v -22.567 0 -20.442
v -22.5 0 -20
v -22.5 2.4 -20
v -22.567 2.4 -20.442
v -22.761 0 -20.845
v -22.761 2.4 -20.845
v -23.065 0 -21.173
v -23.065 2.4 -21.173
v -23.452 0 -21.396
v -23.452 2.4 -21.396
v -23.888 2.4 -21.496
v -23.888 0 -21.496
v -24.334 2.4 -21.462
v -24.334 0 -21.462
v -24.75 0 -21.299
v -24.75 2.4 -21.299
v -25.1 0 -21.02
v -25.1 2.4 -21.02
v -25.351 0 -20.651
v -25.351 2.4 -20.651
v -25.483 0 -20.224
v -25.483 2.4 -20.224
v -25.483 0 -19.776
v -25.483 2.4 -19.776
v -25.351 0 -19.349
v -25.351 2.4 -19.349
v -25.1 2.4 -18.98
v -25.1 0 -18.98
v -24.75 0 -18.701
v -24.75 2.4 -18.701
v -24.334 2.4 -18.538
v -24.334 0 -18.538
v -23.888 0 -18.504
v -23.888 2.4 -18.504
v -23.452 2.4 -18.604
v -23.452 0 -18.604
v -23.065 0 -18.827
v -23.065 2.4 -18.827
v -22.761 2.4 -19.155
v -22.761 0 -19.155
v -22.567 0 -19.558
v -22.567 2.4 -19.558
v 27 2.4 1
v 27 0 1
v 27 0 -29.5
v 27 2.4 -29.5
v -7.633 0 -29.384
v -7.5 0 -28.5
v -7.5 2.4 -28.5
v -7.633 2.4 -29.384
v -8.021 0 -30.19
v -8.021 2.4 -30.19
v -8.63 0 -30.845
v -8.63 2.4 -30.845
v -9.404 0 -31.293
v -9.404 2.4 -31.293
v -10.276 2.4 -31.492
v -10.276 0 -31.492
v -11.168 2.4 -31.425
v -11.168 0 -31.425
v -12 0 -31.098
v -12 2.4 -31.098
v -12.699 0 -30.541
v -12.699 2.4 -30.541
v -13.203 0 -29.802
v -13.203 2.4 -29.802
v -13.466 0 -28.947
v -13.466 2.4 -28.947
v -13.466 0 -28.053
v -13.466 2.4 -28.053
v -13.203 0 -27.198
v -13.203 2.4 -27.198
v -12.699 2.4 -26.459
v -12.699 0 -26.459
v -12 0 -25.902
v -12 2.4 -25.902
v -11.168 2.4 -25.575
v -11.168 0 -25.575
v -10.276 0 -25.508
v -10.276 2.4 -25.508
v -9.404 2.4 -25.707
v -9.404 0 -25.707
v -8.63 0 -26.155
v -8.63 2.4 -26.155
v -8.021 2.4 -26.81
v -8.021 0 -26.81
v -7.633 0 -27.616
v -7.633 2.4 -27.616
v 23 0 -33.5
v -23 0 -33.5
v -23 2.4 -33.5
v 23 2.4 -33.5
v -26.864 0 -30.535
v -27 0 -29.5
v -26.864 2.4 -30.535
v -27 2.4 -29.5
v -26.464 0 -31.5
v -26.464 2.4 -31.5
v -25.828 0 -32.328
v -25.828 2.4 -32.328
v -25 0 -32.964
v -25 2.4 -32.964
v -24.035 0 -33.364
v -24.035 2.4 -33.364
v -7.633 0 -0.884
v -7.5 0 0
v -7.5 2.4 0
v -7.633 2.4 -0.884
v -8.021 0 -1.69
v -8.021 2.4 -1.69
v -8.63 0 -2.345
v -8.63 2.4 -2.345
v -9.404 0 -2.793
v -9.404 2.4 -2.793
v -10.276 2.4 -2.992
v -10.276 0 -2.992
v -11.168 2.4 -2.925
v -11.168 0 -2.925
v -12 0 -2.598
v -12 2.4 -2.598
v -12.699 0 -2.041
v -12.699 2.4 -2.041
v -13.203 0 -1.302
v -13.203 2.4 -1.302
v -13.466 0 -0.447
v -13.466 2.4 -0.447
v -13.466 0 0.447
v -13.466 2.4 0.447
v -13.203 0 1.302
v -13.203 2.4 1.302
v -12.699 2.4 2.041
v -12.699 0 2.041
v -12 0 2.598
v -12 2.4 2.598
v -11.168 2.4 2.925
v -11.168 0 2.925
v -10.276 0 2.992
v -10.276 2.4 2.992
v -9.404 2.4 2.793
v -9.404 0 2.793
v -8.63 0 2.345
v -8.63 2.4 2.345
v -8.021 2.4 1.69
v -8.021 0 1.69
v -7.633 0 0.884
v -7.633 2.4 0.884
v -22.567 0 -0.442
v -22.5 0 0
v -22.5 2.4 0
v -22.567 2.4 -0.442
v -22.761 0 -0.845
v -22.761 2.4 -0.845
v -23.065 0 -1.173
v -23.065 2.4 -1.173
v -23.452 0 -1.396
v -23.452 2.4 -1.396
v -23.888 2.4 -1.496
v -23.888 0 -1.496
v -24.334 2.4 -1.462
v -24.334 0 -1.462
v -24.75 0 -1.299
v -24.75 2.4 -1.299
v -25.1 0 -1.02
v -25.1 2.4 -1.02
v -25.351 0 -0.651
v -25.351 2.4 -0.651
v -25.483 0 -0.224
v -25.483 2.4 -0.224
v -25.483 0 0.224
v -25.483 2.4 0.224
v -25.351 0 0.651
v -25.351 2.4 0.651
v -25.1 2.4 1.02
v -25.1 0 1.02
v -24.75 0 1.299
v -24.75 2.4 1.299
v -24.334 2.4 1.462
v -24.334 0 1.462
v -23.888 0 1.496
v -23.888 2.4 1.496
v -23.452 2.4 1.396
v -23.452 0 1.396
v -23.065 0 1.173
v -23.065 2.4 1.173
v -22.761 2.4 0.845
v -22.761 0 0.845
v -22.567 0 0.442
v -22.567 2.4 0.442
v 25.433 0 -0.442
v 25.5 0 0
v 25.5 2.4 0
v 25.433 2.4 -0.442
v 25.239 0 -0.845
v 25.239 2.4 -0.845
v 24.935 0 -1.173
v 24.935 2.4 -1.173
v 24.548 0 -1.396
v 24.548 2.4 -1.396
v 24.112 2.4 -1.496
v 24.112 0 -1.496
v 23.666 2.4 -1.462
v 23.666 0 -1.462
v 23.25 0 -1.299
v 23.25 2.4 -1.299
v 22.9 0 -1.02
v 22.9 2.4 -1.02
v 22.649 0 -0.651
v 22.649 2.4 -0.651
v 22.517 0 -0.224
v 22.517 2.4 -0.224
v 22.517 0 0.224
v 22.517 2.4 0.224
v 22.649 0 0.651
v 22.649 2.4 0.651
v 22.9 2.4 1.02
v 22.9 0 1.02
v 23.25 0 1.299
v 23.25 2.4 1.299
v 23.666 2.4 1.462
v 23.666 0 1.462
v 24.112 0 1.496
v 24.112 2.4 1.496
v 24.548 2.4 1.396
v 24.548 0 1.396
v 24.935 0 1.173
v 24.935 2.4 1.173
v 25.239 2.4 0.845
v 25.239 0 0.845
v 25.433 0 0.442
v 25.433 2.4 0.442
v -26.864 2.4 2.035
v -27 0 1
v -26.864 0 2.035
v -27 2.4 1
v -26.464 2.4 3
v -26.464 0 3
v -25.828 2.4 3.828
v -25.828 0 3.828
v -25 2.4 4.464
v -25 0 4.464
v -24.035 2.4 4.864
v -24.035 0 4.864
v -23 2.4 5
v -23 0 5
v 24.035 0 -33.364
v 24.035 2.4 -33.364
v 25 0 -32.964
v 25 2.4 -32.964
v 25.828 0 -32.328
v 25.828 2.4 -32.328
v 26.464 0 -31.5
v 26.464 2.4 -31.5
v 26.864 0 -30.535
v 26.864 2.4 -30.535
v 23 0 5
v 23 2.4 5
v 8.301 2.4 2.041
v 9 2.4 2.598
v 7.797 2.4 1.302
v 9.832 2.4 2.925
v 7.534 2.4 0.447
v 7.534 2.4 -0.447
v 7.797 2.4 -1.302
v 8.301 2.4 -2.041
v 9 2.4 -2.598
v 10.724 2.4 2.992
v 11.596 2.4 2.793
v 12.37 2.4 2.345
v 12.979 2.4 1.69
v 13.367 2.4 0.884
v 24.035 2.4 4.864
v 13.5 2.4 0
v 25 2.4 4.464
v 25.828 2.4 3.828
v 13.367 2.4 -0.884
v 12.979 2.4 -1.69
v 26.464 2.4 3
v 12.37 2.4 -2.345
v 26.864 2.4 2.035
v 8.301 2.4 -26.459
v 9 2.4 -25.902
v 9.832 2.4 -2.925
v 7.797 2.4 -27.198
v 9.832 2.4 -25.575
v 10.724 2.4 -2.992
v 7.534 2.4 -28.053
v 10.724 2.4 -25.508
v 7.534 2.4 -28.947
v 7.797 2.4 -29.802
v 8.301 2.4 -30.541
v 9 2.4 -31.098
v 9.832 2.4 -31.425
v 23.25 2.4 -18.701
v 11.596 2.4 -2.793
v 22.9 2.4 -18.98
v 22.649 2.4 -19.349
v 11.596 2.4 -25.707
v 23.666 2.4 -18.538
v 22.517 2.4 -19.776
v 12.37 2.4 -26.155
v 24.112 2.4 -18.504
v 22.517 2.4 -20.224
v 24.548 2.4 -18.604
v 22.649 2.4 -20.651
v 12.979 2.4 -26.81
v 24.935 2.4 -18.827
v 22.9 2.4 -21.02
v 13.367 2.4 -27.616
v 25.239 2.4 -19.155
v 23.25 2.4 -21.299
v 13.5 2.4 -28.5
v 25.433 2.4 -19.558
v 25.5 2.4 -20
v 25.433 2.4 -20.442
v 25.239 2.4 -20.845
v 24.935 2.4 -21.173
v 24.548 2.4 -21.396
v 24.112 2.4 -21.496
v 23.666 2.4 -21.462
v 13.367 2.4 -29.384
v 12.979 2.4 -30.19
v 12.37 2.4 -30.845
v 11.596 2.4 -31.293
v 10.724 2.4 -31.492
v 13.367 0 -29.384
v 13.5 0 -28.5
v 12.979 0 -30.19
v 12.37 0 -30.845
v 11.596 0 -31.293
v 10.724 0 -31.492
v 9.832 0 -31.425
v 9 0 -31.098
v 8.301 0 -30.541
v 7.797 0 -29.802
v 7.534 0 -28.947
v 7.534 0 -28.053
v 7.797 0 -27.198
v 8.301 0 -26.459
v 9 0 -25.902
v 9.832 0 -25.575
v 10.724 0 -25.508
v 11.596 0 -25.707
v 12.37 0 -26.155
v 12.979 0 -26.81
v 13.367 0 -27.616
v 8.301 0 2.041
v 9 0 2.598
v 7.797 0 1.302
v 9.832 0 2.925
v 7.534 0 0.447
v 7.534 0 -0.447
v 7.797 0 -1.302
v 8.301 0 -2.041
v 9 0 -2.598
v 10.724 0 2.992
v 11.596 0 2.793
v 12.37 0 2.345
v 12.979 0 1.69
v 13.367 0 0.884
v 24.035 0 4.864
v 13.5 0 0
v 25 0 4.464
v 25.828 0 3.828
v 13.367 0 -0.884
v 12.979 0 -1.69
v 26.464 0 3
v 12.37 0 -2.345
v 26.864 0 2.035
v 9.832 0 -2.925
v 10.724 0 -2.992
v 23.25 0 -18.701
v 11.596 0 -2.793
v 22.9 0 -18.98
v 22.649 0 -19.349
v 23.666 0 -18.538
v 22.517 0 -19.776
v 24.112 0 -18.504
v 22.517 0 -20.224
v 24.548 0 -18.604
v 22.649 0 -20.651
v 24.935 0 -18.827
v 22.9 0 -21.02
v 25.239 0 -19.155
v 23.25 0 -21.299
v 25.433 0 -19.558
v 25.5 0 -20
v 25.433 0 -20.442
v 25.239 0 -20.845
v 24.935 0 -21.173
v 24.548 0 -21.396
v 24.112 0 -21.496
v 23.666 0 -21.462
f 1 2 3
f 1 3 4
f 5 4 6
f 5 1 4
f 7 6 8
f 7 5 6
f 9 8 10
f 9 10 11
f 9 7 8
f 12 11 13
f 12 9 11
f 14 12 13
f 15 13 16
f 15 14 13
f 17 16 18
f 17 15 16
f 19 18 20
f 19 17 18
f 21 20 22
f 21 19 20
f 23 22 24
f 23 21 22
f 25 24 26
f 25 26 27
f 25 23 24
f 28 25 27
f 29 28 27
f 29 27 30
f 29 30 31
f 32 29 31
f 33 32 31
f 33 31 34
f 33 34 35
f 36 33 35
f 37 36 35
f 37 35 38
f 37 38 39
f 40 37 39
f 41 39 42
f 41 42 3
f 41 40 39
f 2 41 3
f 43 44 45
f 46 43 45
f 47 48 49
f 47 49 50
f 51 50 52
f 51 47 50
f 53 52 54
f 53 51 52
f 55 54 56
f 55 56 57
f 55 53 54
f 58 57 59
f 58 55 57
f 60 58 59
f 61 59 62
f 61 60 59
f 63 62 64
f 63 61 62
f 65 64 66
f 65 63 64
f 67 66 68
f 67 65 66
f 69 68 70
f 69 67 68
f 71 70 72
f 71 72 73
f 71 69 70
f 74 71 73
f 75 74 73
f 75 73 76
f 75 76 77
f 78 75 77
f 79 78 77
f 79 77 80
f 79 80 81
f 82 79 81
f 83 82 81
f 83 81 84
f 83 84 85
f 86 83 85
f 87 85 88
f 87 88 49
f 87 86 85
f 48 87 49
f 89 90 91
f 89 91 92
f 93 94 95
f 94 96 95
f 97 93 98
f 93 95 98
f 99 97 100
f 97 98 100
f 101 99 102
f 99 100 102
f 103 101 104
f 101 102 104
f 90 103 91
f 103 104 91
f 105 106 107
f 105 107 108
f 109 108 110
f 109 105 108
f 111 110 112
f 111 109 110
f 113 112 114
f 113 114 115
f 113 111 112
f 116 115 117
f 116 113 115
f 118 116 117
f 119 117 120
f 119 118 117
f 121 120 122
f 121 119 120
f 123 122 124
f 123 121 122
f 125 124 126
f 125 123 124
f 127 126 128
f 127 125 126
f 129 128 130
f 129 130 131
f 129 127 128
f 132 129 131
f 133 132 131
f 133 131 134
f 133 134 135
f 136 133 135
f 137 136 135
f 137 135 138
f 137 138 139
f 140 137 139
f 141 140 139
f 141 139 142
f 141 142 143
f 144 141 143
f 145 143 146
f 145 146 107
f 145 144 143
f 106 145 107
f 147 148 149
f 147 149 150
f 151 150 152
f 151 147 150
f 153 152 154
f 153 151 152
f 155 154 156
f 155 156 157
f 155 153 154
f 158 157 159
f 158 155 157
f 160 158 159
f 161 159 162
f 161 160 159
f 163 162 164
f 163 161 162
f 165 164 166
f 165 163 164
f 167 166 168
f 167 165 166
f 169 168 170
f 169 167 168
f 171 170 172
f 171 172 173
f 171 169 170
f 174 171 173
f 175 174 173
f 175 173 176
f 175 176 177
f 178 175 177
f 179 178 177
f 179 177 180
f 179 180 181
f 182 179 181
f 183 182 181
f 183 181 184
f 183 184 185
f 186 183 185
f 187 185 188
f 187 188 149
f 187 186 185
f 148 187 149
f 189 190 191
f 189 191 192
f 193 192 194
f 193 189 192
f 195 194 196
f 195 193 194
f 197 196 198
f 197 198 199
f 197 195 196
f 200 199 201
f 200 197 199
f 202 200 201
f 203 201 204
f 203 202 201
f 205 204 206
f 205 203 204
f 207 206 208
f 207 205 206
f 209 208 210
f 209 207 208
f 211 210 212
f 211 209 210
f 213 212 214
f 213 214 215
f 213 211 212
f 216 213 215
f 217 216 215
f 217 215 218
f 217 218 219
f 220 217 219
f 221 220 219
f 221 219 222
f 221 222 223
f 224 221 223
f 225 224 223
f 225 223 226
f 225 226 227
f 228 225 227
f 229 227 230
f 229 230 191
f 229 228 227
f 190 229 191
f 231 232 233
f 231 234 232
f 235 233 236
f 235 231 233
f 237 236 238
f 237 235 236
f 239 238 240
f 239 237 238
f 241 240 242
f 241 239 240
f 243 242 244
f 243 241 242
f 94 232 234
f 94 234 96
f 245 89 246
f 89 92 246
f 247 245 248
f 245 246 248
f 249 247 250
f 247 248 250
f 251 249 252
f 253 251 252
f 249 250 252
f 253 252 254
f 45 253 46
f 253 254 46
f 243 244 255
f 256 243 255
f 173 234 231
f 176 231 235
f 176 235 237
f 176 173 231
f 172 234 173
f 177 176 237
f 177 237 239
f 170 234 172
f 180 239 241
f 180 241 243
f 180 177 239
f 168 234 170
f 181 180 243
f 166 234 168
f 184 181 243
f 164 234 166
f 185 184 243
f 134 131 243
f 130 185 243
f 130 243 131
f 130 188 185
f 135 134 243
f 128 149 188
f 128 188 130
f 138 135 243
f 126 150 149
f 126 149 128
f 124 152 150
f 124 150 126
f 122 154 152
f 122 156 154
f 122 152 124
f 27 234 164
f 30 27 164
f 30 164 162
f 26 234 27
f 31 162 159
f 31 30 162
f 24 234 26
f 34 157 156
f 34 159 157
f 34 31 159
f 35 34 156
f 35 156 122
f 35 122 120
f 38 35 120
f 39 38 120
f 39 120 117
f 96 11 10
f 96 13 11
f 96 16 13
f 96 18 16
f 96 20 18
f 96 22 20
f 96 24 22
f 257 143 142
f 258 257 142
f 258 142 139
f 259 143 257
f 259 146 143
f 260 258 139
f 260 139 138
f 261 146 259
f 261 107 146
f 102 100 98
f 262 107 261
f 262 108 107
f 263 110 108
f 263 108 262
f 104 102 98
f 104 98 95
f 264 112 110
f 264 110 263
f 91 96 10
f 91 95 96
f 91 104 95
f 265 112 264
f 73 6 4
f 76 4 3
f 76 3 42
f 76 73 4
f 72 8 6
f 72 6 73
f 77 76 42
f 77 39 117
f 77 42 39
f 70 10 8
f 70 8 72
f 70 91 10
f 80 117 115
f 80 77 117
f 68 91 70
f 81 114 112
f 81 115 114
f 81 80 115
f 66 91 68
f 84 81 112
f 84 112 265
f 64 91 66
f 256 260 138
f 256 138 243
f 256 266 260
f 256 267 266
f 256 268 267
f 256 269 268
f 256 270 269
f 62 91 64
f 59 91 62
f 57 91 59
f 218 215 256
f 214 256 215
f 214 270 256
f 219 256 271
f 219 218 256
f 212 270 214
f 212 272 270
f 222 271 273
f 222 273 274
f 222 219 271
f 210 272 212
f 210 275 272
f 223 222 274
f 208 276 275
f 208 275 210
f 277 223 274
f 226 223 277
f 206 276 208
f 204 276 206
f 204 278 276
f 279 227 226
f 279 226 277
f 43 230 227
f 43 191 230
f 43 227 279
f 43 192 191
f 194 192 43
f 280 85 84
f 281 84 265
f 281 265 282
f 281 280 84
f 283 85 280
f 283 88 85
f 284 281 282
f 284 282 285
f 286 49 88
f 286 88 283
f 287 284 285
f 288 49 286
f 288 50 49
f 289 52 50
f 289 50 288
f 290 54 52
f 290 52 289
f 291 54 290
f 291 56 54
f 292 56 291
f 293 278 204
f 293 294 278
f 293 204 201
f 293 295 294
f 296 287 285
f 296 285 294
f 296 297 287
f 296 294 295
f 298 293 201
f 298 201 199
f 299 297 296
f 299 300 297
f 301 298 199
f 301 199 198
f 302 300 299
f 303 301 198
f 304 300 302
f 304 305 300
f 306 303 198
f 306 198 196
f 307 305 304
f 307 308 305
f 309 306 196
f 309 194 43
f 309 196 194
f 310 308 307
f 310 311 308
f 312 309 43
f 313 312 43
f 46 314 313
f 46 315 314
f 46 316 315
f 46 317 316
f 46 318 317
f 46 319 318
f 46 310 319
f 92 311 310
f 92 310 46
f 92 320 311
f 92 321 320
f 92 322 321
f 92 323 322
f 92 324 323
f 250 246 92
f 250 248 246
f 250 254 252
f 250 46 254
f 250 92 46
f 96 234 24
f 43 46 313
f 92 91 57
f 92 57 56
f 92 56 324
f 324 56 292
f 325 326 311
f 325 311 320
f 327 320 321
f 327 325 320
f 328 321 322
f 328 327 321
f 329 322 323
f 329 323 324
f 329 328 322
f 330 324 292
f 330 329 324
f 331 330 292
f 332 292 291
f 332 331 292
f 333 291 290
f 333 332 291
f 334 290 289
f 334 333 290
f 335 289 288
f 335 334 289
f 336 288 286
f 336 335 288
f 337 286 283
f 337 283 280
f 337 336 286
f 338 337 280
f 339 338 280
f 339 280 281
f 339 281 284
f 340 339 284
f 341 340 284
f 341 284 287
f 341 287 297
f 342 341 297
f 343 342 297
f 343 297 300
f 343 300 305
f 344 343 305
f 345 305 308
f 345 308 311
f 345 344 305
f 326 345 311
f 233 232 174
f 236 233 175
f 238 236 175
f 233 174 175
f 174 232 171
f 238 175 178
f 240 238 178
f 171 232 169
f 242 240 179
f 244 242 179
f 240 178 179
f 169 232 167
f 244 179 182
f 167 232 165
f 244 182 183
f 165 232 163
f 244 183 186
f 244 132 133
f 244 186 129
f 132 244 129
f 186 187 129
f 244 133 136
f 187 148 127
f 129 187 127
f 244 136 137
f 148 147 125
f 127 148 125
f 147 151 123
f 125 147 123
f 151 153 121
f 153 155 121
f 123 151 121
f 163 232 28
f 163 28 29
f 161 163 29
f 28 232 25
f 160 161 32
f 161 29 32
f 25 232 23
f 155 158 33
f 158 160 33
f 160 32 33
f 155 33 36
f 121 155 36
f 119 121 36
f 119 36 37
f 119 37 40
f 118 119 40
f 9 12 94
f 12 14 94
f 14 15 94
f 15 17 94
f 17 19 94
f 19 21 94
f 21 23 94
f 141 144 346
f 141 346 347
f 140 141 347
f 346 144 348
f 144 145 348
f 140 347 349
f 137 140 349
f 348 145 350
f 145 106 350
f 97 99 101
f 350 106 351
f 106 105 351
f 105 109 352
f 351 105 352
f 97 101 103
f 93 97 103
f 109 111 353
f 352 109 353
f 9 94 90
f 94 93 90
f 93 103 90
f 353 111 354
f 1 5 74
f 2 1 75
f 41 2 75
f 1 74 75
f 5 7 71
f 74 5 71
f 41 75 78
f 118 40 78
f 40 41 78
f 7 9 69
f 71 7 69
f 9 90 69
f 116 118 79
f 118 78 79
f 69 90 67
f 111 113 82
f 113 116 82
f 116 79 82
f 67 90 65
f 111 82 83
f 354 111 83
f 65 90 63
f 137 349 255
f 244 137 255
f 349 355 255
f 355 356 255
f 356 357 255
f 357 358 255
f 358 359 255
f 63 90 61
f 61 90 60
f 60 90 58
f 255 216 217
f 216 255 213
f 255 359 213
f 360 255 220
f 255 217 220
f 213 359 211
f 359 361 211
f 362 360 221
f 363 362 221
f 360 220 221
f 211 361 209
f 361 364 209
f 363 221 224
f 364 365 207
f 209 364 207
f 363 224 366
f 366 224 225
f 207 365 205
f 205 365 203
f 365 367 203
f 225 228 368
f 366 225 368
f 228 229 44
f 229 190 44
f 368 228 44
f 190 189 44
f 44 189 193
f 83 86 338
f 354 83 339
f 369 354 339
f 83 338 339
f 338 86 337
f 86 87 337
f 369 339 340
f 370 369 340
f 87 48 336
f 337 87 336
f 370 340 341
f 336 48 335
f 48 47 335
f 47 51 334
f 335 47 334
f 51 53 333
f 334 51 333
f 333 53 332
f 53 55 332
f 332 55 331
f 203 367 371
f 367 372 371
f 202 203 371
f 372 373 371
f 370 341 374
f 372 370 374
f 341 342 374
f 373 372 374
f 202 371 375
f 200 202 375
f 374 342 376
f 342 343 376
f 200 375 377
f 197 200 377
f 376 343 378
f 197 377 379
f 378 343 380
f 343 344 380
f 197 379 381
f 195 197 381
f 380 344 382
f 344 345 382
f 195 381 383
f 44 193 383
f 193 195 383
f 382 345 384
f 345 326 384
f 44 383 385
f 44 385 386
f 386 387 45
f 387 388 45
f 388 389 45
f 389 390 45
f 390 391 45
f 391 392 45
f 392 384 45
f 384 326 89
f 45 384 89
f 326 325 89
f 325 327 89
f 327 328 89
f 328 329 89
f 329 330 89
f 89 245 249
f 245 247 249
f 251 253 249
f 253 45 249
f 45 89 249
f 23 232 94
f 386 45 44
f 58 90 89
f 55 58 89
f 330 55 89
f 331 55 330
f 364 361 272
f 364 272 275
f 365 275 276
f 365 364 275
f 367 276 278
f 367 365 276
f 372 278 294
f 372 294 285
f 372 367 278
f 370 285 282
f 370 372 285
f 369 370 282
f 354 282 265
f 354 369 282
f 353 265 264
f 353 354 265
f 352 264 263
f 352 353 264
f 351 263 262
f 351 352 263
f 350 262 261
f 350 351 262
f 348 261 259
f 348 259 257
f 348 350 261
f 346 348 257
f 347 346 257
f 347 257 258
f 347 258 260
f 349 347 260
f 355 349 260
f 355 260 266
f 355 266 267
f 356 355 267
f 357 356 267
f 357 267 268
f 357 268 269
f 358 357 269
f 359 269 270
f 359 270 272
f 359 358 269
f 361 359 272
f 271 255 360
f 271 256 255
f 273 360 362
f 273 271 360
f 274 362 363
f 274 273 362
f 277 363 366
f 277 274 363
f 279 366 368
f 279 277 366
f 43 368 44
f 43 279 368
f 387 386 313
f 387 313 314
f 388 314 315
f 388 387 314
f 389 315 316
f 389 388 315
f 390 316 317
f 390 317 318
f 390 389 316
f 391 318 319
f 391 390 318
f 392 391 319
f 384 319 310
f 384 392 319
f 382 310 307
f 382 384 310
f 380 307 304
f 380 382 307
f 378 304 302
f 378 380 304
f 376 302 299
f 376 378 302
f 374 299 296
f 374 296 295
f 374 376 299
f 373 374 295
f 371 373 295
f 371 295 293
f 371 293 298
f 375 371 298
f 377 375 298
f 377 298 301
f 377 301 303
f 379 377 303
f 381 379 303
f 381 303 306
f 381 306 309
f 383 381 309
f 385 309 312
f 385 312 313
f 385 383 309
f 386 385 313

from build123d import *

# Parameters (mm, degrees)
SKETCH_1_W      = 54
SKETCH_1_H      = 38.5
SKETCH_1_R      = 1.5
SKETCH_1_R_2    = 3
EXTRUDE_1_DEPTH = 2.4
FILLET_1_R      = 4


with BuildPart() as part:
    # 草圖1 → 填料-伸長1 (new body)
    with BuildSketch(Plane(origin=(0, 0, 0), x_dir=(1, 0, 0), z_dir=(0, 1, 0))):
        with Locations((0, 14.25)):
            Rectangle(SKETCH_1_W, SKETCH_1_H)
        with Locations((-24, 0)):
            Circle(SKETCH_1_R, mode=Mode.SUBTRACT)
        with Locations((24, 0)):
            Circle(SKETCH_1_R, mode=Mode.SUBTRACT)
        with Locations((-10.5, 28.5)):
            Circle(SKETCH_1_R_2, mode=Mode.SUBTRACT)
        with Locations((10.5, 28.5)):
            Circle(SKETCH_1_R_2, mode=Mode.SUBTRACT)
        with Locations((-10.5, 0)):
            Circle(SKETCH_1_R_2, mode=Mode.SUBTRACT)
        with Locations((10.5, 0)):
            Circle(SKETCH_1_R_2, mode=Mode.SUBTRACT)
        with Locations((24, 20)):
            Circle(SKETCH_1_R, mode=Mode.SUBTRACT)
        with Locations((-24, 20)):
            Circle(SKETCH_1_R, mode=Mode.SUBTRACT)
    extrude(amount=EXTRUDE_1_DEPTH)

    # 圓角1
    fillet_1_edges = [part.edges().sort_by_distance(p)[0] for p in [
        (27, 1.2, 5),
        (-27, 1.2, 5),
        (-27, 1.2, -33.5),
        (27, 1.2, -33.5),
    ]]
    fillet(fillet_1_edges, radius=FILLET_1_R)


solid = part.part
